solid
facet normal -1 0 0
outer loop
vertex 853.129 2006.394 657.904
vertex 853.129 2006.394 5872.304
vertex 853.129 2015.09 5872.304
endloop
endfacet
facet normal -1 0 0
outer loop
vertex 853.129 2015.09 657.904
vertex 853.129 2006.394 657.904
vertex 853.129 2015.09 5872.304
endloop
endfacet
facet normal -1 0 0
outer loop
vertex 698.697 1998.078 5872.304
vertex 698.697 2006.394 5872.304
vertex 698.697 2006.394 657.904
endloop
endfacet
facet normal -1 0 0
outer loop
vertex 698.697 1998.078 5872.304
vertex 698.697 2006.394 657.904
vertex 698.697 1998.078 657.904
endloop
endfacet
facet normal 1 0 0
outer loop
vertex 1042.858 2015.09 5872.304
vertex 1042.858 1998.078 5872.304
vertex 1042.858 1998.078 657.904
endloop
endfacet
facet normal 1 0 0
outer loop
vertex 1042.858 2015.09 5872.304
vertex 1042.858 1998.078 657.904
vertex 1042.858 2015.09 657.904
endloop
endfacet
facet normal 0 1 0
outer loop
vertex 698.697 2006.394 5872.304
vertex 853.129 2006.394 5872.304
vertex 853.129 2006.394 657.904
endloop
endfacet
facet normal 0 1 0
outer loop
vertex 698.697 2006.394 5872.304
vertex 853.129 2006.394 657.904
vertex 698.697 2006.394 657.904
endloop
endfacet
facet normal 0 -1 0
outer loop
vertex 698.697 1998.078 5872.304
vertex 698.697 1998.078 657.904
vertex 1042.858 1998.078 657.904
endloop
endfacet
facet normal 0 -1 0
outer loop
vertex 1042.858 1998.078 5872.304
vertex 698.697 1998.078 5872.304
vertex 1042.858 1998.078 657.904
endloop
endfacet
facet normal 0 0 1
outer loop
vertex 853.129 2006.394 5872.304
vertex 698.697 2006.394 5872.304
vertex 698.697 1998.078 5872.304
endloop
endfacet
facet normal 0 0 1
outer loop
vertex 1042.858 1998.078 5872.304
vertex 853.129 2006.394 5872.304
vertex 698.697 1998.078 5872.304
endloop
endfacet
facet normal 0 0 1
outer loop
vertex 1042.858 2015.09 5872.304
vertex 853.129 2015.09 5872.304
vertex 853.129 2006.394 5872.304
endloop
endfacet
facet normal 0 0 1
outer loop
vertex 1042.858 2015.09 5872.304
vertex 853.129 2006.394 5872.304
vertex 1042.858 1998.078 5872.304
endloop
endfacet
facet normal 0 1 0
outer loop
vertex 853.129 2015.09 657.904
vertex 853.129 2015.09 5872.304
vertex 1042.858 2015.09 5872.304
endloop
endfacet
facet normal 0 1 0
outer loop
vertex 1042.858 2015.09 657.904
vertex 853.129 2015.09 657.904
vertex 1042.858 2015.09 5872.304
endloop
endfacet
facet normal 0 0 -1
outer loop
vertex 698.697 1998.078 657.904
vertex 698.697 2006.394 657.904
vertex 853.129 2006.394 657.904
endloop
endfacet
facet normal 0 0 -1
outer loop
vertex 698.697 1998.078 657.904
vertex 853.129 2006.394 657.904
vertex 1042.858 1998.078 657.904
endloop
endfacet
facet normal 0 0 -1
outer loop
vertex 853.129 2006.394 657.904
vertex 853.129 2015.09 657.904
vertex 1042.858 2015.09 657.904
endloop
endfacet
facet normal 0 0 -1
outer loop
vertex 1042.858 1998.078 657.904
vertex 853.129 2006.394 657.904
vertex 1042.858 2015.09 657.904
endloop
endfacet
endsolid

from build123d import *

# Parameters (mm, degrees)
SKETCH1_W           = 189.729626016
SKETCH1_H           = 8.695952253
BOSS_EXTRUDE1_DEPTH = 5214.4


with BuildPart() as part:
    # Sketch1 → Boss-Extrude1 (new body)
    with BuildSketch(Plane.XY.offset(5872.304177203)):
        Polygon((698.696699776, 2006.393572408), (698.696699776, 1998.07798035), (1042.858325792, 1998.07798035), (1042.858325792, 2006.393572408), (853.128699776, 2006.393572408), align=None)
        with Locations((947.993512784, 2010.741548534)):
            Rectangle(SKETCH1_W, SKETCH1_H)
    extrude(amount=-BOSS_EXTRUDE1_DEPTH)


solid = part.part
